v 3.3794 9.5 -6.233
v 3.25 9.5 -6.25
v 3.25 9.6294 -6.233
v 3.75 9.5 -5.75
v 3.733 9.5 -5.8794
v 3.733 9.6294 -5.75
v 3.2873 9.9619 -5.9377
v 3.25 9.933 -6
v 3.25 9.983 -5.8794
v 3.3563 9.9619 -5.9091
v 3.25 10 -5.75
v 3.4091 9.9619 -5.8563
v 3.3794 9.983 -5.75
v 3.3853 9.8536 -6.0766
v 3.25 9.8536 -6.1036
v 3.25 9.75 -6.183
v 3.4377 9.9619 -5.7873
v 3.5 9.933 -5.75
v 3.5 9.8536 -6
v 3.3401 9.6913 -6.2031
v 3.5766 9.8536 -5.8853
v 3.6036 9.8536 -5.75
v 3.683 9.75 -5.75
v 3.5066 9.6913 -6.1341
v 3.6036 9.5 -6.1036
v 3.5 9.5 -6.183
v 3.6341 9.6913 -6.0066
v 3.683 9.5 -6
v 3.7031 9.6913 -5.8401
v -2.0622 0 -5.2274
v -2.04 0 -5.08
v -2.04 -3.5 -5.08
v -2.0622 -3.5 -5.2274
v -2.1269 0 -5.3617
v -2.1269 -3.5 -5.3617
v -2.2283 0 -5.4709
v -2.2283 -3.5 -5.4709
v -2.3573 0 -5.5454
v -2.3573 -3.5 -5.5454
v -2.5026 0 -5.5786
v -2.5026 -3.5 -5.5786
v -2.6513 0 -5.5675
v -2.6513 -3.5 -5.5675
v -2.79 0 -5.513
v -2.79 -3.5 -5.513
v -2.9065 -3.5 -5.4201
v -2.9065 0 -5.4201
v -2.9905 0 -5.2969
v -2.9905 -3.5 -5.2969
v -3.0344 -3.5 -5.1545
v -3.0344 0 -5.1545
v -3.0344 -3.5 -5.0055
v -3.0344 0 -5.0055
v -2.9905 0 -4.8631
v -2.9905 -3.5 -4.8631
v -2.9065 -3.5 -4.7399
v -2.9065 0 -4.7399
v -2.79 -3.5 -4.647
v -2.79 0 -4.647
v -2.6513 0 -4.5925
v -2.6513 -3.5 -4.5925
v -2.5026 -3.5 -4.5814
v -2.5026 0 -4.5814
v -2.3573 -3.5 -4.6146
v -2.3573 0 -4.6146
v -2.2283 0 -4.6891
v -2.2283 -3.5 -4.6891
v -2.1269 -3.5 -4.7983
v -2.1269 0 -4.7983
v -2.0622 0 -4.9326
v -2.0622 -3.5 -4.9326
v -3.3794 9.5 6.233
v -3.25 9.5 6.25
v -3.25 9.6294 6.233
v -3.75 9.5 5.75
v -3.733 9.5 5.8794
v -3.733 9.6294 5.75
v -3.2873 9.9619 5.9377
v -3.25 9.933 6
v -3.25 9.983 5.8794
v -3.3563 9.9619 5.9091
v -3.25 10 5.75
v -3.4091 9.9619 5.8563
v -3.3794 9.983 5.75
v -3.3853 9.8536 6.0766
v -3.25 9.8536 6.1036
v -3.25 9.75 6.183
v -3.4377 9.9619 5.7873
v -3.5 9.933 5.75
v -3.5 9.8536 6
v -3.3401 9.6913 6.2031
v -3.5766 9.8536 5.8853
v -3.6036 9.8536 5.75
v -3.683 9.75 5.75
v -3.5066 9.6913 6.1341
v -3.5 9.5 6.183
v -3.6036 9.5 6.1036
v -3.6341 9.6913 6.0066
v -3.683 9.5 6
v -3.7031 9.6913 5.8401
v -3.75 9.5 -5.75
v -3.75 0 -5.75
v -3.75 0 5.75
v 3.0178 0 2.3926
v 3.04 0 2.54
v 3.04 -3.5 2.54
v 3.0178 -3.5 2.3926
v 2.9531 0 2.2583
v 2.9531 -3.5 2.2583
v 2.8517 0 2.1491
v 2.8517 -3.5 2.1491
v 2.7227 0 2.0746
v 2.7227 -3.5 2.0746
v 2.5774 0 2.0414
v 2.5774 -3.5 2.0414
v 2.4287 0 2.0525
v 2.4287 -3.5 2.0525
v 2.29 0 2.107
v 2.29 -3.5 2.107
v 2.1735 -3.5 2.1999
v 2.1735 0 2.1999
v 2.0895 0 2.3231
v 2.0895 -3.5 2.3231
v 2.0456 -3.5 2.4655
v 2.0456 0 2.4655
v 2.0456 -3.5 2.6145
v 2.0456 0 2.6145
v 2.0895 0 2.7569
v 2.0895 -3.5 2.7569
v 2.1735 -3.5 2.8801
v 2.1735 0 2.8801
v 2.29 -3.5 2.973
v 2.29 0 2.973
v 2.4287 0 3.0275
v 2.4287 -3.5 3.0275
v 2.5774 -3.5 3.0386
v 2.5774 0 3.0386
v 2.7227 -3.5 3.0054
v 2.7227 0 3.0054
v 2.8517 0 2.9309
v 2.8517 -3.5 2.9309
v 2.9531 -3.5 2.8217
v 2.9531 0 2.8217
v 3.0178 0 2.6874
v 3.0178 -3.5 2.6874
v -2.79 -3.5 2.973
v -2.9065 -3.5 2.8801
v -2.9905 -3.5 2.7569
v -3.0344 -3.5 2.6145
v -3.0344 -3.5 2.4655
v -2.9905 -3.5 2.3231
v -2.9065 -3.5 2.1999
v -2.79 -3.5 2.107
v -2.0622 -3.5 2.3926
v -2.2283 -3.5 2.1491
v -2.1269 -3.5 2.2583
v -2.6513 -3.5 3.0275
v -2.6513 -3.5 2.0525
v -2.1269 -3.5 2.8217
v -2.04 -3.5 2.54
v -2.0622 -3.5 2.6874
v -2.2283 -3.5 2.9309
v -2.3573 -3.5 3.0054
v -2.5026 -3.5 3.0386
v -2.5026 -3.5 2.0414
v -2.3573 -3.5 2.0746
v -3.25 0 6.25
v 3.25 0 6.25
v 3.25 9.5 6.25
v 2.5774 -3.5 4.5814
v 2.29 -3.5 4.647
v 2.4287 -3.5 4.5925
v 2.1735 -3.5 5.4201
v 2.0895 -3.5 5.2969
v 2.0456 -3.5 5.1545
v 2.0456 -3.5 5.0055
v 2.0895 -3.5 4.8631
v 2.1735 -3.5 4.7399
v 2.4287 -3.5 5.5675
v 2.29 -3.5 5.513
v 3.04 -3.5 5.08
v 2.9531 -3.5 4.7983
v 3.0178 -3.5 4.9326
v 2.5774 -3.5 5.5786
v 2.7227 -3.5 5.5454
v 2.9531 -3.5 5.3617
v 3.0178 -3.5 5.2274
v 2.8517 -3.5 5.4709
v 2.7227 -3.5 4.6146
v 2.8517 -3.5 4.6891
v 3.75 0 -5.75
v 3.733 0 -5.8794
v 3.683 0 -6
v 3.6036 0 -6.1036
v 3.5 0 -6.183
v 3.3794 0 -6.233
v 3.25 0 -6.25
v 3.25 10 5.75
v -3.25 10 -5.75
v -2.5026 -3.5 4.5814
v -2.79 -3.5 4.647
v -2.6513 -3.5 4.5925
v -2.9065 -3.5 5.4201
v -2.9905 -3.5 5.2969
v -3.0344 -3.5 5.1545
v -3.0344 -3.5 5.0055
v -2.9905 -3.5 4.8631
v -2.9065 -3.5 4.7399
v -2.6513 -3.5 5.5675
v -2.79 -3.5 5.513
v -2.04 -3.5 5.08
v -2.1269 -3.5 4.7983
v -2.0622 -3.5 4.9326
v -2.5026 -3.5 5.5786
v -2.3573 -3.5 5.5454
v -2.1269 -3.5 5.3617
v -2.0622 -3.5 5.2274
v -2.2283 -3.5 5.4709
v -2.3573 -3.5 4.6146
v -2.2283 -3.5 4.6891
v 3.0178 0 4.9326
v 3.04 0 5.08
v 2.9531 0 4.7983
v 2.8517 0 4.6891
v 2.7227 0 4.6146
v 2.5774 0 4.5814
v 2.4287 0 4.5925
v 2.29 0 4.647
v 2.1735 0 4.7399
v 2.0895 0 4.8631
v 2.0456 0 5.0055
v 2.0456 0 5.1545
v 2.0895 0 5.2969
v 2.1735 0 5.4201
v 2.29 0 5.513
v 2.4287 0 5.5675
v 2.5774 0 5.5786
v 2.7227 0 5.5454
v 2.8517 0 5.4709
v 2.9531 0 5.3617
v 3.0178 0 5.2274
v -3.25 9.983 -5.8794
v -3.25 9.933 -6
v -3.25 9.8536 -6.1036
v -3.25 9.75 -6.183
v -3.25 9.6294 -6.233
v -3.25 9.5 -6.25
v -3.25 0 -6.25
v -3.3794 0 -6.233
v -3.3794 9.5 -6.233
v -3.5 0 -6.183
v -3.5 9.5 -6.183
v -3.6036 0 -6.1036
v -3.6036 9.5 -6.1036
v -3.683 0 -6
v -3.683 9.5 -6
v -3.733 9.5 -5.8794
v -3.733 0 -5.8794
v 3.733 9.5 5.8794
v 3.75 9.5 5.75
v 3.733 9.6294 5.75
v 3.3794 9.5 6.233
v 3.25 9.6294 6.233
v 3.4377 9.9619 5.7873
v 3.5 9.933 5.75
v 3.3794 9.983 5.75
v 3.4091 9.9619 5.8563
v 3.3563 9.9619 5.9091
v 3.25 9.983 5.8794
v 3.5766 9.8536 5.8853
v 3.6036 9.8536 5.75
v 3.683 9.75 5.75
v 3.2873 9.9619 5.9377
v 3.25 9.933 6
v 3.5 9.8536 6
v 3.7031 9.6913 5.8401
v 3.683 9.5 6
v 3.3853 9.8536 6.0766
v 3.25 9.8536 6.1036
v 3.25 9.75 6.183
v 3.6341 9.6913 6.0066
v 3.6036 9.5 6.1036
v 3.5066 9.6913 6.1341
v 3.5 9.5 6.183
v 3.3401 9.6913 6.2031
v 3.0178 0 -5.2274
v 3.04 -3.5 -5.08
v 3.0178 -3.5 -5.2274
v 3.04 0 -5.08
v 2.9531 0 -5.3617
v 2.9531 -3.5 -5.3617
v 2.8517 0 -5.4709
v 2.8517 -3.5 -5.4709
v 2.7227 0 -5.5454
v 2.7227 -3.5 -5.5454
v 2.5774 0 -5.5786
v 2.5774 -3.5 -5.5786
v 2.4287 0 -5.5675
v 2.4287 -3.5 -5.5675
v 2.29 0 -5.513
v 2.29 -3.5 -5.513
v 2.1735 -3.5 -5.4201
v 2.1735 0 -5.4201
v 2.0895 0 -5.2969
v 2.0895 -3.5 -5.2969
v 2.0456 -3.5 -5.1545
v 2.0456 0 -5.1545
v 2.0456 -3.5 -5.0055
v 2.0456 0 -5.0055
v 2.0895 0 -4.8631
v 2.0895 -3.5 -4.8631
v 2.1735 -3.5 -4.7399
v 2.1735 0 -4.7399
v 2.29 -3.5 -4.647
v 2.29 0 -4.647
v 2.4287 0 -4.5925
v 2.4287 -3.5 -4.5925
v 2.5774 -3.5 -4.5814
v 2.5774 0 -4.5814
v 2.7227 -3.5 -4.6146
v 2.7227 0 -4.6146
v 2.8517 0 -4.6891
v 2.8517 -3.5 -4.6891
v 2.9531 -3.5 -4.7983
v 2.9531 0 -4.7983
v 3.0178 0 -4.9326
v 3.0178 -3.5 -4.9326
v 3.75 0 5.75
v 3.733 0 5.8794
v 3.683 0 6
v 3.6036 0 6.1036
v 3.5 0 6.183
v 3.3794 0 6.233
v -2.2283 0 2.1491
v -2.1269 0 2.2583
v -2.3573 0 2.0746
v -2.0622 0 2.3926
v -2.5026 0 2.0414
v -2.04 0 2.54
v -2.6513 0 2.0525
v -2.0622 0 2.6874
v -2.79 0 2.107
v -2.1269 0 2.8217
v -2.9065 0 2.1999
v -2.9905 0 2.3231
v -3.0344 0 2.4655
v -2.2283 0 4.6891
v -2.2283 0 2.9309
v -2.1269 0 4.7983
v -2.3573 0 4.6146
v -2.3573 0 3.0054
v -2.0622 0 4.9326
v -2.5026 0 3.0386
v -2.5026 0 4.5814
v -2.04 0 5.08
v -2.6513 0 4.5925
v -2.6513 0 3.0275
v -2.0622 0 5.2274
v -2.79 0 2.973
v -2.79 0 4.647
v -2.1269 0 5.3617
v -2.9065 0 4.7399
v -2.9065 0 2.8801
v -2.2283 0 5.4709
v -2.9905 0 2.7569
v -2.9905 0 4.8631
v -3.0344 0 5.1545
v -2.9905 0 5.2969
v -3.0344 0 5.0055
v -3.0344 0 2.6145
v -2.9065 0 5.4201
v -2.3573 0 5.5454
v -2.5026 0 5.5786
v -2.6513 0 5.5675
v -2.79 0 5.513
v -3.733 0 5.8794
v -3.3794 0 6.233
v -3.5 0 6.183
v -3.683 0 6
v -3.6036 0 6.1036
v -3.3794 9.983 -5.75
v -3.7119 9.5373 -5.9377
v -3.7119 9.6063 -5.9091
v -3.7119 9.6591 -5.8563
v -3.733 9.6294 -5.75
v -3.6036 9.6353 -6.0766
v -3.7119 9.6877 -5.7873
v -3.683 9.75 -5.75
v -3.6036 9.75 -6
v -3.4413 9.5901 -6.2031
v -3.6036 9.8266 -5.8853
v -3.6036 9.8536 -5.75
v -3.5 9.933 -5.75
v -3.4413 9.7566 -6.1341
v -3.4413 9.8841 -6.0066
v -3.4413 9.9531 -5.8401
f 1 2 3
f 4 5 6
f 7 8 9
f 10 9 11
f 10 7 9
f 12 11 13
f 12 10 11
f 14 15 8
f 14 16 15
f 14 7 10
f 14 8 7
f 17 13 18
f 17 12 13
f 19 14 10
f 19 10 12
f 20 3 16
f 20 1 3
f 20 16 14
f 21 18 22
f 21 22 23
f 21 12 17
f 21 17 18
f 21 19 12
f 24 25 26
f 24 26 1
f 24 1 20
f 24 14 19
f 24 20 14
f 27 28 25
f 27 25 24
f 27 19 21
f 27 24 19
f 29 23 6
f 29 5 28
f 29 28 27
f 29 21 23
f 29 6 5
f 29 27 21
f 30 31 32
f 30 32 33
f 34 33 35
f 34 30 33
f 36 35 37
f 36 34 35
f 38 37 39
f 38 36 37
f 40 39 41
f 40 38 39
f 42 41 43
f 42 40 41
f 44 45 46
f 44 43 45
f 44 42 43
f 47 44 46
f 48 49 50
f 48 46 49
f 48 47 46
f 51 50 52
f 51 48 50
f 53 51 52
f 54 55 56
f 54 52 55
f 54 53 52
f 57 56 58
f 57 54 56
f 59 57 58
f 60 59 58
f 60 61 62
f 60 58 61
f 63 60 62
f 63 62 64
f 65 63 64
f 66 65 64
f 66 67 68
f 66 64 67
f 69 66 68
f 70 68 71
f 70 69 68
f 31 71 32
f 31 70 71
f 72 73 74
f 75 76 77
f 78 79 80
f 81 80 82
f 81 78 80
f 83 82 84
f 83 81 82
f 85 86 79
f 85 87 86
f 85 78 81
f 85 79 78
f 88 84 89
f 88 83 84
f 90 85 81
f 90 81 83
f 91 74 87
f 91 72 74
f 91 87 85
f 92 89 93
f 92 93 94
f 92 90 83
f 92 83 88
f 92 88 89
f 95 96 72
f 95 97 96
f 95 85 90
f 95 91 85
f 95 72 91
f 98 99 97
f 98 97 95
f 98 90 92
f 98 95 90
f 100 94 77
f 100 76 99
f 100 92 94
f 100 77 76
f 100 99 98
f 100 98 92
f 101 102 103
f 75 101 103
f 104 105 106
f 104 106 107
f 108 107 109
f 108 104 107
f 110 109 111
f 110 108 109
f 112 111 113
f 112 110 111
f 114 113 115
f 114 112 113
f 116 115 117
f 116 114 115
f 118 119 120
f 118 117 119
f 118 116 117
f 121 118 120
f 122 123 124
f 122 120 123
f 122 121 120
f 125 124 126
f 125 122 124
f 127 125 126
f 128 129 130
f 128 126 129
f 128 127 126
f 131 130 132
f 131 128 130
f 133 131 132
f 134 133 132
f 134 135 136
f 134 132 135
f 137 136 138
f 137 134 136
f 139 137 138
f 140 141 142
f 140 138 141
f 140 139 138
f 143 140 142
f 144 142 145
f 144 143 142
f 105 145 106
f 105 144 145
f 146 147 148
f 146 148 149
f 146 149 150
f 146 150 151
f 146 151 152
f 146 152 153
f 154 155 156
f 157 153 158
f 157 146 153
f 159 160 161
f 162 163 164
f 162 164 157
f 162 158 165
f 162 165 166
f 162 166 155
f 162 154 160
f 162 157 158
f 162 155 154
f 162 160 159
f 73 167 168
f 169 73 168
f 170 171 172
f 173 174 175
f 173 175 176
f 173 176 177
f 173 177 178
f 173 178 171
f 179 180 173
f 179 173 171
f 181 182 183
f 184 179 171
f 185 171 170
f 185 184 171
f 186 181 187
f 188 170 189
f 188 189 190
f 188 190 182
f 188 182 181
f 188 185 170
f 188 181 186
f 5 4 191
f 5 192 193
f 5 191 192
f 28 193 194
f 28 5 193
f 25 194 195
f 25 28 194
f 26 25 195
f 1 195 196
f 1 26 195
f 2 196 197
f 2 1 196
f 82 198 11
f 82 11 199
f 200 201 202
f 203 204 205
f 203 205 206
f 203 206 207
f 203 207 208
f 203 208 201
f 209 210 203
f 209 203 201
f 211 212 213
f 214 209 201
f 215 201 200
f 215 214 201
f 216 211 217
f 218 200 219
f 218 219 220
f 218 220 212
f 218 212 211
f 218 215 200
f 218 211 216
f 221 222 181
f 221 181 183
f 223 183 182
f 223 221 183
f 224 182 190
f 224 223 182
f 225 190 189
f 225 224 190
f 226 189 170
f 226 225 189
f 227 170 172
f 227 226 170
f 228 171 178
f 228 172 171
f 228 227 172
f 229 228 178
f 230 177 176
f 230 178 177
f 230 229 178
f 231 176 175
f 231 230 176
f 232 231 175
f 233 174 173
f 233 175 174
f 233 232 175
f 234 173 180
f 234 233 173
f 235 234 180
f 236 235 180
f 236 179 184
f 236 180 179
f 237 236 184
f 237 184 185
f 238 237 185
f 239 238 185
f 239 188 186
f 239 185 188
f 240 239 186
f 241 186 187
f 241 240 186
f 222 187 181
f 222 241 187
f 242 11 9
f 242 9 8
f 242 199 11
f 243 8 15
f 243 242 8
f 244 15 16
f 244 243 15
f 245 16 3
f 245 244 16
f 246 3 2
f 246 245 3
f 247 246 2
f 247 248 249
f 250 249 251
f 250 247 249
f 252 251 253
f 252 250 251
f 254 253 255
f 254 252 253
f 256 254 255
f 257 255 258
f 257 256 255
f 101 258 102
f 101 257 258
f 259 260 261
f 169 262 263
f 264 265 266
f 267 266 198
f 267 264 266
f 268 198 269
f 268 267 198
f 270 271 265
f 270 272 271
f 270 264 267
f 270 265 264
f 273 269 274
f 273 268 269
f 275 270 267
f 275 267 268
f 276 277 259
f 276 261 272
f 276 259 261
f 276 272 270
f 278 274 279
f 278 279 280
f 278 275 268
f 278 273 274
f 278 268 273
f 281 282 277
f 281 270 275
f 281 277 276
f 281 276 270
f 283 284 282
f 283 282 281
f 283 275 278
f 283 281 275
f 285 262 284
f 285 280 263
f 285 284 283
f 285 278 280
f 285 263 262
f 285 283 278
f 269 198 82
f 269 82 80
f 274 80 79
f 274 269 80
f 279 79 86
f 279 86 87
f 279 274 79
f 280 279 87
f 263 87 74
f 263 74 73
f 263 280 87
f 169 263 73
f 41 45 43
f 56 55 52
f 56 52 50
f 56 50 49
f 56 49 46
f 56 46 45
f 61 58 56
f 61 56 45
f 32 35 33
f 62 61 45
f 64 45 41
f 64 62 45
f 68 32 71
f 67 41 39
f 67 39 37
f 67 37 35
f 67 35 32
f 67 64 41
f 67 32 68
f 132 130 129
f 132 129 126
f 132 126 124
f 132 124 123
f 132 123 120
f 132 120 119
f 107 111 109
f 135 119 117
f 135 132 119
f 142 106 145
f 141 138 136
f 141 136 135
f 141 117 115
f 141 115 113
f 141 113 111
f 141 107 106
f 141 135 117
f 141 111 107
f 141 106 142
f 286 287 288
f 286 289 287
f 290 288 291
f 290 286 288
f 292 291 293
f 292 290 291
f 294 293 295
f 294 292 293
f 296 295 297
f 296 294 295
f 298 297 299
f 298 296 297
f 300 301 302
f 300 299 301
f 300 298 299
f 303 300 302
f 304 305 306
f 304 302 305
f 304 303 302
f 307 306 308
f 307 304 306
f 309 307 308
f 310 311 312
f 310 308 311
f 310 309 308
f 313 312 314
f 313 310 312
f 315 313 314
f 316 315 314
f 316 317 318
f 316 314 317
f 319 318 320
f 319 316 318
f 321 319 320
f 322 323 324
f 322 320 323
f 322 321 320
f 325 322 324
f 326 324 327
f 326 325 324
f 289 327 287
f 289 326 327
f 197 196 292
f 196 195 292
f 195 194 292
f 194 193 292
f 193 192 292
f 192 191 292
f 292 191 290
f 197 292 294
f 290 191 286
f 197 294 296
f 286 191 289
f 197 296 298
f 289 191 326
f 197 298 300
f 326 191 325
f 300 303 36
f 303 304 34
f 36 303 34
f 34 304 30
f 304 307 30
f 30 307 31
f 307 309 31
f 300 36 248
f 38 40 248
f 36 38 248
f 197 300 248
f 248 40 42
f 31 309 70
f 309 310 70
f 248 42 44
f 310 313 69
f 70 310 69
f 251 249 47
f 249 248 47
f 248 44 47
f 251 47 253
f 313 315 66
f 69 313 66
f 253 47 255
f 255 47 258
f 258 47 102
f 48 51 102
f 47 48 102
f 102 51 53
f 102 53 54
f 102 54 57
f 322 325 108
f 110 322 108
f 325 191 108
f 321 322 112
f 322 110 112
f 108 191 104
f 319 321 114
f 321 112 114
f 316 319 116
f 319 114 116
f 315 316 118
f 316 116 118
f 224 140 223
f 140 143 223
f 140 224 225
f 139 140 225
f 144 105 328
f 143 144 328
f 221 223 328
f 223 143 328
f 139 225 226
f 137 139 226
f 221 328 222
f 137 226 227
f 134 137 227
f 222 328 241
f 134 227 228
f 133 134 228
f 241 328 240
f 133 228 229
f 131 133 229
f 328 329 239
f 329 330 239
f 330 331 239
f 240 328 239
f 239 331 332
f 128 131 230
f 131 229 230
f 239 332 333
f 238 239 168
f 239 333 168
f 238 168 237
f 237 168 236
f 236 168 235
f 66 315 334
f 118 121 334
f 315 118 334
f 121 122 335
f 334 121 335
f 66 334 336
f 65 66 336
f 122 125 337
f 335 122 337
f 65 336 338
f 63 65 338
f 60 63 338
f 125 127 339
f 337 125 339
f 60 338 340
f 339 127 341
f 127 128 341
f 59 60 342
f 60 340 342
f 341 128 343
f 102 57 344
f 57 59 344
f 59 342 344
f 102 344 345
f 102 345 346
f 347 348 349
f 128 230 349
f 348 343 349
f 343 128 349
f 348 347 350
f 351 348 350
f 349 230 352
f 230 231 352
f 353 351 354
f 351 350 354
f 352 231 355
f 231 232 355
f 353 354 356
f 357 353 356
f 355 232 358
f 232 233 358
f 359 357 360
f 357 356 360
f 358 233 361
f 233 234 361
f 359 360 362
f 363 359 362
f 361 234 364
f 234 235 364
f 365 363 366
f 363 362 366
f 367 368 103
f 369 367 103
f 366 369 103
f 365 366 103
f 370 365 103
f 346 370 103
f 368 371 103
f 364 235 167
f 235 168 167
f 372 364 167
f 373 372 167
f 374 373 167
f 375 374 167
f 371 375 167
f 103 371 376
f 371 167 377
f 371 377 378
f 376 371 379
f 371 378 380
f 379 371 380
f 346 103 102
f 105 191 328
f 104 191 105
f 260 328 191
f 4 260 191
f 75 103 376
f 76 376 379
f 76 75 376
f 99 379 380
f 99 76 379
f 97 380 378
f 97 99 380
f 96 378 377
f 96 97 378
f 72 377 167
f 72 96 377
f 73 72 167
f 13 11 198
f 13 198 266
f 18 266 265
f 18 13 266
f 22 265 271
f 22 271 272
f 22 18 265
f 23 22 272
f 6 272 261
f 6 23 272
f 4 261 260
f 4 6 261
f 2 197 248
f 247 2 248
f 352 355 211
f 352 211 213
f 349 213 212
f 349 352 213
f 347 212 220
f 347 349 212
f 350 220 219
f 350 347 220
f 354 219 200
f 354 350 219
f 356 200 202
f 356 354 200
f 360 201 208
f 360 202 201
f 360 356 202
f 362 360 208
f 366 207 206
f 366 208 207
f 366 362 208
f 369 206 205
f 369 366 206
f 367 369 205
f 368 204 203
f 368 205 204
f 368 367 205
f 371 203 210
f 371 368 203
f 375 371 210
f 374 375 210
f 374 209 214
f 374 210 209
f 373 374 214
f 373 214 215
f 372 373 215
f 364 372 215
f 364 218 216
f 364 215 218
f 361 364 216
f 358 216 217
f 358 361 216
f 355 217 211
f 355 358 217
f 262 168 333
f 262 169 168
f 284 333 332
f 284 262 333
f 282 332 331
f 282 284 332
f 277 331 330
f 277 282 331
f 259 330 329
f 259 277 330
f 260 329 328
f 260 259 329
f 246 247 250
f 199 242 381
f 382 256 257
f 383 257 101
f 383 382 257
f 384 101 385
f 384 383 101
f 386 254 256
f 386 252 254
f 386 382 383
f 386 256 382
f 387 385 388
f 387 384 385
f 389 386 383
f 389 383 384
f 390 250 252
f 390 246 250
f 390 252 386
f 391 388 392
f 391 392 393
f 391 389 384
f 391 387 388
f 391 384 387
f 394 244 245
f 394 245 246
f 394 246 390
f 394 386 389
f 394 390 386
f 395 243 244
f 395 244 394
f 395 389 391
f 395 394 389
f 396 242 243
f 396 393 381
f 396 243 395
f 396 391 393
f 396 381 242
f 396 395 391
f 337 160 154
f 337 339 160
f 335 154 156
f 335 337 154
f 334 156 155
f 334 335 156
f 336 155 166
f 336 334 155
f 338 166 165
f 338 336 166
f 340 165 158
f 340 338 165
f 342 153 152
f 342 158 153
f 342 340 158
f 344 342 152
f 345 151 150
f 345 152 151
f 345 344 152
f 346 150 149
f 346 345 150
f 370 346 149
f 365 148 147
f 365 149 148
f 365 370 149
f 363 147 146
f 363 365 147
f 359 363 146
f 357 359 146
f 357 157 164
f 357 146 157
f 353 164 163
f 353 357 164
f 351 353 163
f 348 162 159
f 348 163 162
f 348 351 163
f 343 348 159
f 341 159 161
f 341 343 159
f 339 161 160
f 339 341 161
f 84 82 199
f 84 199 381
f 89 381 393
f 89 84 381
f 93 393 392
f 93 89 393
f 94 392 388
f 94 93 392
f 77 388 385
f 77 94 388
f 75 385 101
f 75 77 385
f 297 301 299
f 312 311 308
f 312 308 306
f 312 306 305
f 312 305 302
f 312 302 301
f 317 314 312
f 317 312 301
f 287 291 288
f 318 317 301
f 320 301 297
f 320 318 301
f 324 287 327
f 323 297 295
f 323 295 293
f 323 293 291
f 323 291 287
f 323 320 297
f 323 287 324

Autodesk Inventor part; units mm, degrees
ref_plane "YZ Plane" through (0, 0, 0) normal (1, 0, 0) x (0, 1, 0)
ref_plane "XZ Plane" through (0, 0, 0) normal (0, 1, 0) x (-1, 0, 0)
ref_plane "XY Plane" through (0, 0, 0) normal (0, 0, 1) x (1, 0, 0)
sketch "Sketch1" plane through (0, 0, 0) normal (0, 1, 0) x (-1, 0, 0)
  line L0 (3.75, 6.25) -> (-3.75, 6.25)
  line L1 (-3.75, 6.25) -> (-3.75, -6.25)
  line L2 (-3.75, -6.25) -> (3.75, -6.25)
  line L3 (3.75, -6.25) -> (3.75, 6.25)
  point P0 (0, 0)
  dimension "d0" = 7.5
  dimension "d1" = 3.75
  dimension "d2" = 12.5
  dimension "d3" = 6.25
extrude "Extrusion1" add sketch "Sketch1" along normal blind 10
fillet "Fillet1" radius 0.5 8 edges at (3.75, 5, -6.25) (3.75, 5, 6.25) (-3.75, 5, 6.25) (0, 10, 6.25) (3.75, 10, 0) (0, 10, -6.25) (-3.75, 10, 0) (-3.75, 5, -6.25)
sketch "Sketch2" plane through (0, 0, 0) normal (0, -1, 0) x (1, 0, 0)
  circle A0 centre (2.54, 5.08) radius 0.5
  line L0 (3.75, 5.75) -> (3.75, -5.75) projected
  line L1 (3.75, 1.9877) -> (3.75, 0.9043)
  line L2 (1.2566, 6.25) -> (0.5094, 6.25)
  line L3 (-3.25, 6.25) -> (3.25, 6.25) projected
  circle A1 centre (2.54, 2.54) radius 0.5
  circle A2 centre (2.54, 0) radius 0.5
  circle A3 centre (2.54, -2.54) radius 0.5
  circle A4 centre (2.54, -5.08) radius 0.5
  circle A5 centre (-2.54, 5.08) radius 0.5
  circle A6 centre (-2.54, 2.54) radius 0.5
  circle A7 centre (-2.54, 0) radius 0.5
  circle A8 centre (-2.54, -2.54) radius 0.5
  circle A9 centre (-2.54, -5.08) radius 0.5
  point P0 (0, 0)
  dimension "d7" = 1
  dimension "d8" = 2.54
  dimension "d9" = 5.08
  dimension "d12" = 2.54
  dimension "d15" = 5.08
extrude "Extrusion2" add sketch "Sketch2" along normal blind 3.5 contours A0 | A1 | A4 | A5 | A6 | A9
properties part number "G5V-1-DC5_Relay"
